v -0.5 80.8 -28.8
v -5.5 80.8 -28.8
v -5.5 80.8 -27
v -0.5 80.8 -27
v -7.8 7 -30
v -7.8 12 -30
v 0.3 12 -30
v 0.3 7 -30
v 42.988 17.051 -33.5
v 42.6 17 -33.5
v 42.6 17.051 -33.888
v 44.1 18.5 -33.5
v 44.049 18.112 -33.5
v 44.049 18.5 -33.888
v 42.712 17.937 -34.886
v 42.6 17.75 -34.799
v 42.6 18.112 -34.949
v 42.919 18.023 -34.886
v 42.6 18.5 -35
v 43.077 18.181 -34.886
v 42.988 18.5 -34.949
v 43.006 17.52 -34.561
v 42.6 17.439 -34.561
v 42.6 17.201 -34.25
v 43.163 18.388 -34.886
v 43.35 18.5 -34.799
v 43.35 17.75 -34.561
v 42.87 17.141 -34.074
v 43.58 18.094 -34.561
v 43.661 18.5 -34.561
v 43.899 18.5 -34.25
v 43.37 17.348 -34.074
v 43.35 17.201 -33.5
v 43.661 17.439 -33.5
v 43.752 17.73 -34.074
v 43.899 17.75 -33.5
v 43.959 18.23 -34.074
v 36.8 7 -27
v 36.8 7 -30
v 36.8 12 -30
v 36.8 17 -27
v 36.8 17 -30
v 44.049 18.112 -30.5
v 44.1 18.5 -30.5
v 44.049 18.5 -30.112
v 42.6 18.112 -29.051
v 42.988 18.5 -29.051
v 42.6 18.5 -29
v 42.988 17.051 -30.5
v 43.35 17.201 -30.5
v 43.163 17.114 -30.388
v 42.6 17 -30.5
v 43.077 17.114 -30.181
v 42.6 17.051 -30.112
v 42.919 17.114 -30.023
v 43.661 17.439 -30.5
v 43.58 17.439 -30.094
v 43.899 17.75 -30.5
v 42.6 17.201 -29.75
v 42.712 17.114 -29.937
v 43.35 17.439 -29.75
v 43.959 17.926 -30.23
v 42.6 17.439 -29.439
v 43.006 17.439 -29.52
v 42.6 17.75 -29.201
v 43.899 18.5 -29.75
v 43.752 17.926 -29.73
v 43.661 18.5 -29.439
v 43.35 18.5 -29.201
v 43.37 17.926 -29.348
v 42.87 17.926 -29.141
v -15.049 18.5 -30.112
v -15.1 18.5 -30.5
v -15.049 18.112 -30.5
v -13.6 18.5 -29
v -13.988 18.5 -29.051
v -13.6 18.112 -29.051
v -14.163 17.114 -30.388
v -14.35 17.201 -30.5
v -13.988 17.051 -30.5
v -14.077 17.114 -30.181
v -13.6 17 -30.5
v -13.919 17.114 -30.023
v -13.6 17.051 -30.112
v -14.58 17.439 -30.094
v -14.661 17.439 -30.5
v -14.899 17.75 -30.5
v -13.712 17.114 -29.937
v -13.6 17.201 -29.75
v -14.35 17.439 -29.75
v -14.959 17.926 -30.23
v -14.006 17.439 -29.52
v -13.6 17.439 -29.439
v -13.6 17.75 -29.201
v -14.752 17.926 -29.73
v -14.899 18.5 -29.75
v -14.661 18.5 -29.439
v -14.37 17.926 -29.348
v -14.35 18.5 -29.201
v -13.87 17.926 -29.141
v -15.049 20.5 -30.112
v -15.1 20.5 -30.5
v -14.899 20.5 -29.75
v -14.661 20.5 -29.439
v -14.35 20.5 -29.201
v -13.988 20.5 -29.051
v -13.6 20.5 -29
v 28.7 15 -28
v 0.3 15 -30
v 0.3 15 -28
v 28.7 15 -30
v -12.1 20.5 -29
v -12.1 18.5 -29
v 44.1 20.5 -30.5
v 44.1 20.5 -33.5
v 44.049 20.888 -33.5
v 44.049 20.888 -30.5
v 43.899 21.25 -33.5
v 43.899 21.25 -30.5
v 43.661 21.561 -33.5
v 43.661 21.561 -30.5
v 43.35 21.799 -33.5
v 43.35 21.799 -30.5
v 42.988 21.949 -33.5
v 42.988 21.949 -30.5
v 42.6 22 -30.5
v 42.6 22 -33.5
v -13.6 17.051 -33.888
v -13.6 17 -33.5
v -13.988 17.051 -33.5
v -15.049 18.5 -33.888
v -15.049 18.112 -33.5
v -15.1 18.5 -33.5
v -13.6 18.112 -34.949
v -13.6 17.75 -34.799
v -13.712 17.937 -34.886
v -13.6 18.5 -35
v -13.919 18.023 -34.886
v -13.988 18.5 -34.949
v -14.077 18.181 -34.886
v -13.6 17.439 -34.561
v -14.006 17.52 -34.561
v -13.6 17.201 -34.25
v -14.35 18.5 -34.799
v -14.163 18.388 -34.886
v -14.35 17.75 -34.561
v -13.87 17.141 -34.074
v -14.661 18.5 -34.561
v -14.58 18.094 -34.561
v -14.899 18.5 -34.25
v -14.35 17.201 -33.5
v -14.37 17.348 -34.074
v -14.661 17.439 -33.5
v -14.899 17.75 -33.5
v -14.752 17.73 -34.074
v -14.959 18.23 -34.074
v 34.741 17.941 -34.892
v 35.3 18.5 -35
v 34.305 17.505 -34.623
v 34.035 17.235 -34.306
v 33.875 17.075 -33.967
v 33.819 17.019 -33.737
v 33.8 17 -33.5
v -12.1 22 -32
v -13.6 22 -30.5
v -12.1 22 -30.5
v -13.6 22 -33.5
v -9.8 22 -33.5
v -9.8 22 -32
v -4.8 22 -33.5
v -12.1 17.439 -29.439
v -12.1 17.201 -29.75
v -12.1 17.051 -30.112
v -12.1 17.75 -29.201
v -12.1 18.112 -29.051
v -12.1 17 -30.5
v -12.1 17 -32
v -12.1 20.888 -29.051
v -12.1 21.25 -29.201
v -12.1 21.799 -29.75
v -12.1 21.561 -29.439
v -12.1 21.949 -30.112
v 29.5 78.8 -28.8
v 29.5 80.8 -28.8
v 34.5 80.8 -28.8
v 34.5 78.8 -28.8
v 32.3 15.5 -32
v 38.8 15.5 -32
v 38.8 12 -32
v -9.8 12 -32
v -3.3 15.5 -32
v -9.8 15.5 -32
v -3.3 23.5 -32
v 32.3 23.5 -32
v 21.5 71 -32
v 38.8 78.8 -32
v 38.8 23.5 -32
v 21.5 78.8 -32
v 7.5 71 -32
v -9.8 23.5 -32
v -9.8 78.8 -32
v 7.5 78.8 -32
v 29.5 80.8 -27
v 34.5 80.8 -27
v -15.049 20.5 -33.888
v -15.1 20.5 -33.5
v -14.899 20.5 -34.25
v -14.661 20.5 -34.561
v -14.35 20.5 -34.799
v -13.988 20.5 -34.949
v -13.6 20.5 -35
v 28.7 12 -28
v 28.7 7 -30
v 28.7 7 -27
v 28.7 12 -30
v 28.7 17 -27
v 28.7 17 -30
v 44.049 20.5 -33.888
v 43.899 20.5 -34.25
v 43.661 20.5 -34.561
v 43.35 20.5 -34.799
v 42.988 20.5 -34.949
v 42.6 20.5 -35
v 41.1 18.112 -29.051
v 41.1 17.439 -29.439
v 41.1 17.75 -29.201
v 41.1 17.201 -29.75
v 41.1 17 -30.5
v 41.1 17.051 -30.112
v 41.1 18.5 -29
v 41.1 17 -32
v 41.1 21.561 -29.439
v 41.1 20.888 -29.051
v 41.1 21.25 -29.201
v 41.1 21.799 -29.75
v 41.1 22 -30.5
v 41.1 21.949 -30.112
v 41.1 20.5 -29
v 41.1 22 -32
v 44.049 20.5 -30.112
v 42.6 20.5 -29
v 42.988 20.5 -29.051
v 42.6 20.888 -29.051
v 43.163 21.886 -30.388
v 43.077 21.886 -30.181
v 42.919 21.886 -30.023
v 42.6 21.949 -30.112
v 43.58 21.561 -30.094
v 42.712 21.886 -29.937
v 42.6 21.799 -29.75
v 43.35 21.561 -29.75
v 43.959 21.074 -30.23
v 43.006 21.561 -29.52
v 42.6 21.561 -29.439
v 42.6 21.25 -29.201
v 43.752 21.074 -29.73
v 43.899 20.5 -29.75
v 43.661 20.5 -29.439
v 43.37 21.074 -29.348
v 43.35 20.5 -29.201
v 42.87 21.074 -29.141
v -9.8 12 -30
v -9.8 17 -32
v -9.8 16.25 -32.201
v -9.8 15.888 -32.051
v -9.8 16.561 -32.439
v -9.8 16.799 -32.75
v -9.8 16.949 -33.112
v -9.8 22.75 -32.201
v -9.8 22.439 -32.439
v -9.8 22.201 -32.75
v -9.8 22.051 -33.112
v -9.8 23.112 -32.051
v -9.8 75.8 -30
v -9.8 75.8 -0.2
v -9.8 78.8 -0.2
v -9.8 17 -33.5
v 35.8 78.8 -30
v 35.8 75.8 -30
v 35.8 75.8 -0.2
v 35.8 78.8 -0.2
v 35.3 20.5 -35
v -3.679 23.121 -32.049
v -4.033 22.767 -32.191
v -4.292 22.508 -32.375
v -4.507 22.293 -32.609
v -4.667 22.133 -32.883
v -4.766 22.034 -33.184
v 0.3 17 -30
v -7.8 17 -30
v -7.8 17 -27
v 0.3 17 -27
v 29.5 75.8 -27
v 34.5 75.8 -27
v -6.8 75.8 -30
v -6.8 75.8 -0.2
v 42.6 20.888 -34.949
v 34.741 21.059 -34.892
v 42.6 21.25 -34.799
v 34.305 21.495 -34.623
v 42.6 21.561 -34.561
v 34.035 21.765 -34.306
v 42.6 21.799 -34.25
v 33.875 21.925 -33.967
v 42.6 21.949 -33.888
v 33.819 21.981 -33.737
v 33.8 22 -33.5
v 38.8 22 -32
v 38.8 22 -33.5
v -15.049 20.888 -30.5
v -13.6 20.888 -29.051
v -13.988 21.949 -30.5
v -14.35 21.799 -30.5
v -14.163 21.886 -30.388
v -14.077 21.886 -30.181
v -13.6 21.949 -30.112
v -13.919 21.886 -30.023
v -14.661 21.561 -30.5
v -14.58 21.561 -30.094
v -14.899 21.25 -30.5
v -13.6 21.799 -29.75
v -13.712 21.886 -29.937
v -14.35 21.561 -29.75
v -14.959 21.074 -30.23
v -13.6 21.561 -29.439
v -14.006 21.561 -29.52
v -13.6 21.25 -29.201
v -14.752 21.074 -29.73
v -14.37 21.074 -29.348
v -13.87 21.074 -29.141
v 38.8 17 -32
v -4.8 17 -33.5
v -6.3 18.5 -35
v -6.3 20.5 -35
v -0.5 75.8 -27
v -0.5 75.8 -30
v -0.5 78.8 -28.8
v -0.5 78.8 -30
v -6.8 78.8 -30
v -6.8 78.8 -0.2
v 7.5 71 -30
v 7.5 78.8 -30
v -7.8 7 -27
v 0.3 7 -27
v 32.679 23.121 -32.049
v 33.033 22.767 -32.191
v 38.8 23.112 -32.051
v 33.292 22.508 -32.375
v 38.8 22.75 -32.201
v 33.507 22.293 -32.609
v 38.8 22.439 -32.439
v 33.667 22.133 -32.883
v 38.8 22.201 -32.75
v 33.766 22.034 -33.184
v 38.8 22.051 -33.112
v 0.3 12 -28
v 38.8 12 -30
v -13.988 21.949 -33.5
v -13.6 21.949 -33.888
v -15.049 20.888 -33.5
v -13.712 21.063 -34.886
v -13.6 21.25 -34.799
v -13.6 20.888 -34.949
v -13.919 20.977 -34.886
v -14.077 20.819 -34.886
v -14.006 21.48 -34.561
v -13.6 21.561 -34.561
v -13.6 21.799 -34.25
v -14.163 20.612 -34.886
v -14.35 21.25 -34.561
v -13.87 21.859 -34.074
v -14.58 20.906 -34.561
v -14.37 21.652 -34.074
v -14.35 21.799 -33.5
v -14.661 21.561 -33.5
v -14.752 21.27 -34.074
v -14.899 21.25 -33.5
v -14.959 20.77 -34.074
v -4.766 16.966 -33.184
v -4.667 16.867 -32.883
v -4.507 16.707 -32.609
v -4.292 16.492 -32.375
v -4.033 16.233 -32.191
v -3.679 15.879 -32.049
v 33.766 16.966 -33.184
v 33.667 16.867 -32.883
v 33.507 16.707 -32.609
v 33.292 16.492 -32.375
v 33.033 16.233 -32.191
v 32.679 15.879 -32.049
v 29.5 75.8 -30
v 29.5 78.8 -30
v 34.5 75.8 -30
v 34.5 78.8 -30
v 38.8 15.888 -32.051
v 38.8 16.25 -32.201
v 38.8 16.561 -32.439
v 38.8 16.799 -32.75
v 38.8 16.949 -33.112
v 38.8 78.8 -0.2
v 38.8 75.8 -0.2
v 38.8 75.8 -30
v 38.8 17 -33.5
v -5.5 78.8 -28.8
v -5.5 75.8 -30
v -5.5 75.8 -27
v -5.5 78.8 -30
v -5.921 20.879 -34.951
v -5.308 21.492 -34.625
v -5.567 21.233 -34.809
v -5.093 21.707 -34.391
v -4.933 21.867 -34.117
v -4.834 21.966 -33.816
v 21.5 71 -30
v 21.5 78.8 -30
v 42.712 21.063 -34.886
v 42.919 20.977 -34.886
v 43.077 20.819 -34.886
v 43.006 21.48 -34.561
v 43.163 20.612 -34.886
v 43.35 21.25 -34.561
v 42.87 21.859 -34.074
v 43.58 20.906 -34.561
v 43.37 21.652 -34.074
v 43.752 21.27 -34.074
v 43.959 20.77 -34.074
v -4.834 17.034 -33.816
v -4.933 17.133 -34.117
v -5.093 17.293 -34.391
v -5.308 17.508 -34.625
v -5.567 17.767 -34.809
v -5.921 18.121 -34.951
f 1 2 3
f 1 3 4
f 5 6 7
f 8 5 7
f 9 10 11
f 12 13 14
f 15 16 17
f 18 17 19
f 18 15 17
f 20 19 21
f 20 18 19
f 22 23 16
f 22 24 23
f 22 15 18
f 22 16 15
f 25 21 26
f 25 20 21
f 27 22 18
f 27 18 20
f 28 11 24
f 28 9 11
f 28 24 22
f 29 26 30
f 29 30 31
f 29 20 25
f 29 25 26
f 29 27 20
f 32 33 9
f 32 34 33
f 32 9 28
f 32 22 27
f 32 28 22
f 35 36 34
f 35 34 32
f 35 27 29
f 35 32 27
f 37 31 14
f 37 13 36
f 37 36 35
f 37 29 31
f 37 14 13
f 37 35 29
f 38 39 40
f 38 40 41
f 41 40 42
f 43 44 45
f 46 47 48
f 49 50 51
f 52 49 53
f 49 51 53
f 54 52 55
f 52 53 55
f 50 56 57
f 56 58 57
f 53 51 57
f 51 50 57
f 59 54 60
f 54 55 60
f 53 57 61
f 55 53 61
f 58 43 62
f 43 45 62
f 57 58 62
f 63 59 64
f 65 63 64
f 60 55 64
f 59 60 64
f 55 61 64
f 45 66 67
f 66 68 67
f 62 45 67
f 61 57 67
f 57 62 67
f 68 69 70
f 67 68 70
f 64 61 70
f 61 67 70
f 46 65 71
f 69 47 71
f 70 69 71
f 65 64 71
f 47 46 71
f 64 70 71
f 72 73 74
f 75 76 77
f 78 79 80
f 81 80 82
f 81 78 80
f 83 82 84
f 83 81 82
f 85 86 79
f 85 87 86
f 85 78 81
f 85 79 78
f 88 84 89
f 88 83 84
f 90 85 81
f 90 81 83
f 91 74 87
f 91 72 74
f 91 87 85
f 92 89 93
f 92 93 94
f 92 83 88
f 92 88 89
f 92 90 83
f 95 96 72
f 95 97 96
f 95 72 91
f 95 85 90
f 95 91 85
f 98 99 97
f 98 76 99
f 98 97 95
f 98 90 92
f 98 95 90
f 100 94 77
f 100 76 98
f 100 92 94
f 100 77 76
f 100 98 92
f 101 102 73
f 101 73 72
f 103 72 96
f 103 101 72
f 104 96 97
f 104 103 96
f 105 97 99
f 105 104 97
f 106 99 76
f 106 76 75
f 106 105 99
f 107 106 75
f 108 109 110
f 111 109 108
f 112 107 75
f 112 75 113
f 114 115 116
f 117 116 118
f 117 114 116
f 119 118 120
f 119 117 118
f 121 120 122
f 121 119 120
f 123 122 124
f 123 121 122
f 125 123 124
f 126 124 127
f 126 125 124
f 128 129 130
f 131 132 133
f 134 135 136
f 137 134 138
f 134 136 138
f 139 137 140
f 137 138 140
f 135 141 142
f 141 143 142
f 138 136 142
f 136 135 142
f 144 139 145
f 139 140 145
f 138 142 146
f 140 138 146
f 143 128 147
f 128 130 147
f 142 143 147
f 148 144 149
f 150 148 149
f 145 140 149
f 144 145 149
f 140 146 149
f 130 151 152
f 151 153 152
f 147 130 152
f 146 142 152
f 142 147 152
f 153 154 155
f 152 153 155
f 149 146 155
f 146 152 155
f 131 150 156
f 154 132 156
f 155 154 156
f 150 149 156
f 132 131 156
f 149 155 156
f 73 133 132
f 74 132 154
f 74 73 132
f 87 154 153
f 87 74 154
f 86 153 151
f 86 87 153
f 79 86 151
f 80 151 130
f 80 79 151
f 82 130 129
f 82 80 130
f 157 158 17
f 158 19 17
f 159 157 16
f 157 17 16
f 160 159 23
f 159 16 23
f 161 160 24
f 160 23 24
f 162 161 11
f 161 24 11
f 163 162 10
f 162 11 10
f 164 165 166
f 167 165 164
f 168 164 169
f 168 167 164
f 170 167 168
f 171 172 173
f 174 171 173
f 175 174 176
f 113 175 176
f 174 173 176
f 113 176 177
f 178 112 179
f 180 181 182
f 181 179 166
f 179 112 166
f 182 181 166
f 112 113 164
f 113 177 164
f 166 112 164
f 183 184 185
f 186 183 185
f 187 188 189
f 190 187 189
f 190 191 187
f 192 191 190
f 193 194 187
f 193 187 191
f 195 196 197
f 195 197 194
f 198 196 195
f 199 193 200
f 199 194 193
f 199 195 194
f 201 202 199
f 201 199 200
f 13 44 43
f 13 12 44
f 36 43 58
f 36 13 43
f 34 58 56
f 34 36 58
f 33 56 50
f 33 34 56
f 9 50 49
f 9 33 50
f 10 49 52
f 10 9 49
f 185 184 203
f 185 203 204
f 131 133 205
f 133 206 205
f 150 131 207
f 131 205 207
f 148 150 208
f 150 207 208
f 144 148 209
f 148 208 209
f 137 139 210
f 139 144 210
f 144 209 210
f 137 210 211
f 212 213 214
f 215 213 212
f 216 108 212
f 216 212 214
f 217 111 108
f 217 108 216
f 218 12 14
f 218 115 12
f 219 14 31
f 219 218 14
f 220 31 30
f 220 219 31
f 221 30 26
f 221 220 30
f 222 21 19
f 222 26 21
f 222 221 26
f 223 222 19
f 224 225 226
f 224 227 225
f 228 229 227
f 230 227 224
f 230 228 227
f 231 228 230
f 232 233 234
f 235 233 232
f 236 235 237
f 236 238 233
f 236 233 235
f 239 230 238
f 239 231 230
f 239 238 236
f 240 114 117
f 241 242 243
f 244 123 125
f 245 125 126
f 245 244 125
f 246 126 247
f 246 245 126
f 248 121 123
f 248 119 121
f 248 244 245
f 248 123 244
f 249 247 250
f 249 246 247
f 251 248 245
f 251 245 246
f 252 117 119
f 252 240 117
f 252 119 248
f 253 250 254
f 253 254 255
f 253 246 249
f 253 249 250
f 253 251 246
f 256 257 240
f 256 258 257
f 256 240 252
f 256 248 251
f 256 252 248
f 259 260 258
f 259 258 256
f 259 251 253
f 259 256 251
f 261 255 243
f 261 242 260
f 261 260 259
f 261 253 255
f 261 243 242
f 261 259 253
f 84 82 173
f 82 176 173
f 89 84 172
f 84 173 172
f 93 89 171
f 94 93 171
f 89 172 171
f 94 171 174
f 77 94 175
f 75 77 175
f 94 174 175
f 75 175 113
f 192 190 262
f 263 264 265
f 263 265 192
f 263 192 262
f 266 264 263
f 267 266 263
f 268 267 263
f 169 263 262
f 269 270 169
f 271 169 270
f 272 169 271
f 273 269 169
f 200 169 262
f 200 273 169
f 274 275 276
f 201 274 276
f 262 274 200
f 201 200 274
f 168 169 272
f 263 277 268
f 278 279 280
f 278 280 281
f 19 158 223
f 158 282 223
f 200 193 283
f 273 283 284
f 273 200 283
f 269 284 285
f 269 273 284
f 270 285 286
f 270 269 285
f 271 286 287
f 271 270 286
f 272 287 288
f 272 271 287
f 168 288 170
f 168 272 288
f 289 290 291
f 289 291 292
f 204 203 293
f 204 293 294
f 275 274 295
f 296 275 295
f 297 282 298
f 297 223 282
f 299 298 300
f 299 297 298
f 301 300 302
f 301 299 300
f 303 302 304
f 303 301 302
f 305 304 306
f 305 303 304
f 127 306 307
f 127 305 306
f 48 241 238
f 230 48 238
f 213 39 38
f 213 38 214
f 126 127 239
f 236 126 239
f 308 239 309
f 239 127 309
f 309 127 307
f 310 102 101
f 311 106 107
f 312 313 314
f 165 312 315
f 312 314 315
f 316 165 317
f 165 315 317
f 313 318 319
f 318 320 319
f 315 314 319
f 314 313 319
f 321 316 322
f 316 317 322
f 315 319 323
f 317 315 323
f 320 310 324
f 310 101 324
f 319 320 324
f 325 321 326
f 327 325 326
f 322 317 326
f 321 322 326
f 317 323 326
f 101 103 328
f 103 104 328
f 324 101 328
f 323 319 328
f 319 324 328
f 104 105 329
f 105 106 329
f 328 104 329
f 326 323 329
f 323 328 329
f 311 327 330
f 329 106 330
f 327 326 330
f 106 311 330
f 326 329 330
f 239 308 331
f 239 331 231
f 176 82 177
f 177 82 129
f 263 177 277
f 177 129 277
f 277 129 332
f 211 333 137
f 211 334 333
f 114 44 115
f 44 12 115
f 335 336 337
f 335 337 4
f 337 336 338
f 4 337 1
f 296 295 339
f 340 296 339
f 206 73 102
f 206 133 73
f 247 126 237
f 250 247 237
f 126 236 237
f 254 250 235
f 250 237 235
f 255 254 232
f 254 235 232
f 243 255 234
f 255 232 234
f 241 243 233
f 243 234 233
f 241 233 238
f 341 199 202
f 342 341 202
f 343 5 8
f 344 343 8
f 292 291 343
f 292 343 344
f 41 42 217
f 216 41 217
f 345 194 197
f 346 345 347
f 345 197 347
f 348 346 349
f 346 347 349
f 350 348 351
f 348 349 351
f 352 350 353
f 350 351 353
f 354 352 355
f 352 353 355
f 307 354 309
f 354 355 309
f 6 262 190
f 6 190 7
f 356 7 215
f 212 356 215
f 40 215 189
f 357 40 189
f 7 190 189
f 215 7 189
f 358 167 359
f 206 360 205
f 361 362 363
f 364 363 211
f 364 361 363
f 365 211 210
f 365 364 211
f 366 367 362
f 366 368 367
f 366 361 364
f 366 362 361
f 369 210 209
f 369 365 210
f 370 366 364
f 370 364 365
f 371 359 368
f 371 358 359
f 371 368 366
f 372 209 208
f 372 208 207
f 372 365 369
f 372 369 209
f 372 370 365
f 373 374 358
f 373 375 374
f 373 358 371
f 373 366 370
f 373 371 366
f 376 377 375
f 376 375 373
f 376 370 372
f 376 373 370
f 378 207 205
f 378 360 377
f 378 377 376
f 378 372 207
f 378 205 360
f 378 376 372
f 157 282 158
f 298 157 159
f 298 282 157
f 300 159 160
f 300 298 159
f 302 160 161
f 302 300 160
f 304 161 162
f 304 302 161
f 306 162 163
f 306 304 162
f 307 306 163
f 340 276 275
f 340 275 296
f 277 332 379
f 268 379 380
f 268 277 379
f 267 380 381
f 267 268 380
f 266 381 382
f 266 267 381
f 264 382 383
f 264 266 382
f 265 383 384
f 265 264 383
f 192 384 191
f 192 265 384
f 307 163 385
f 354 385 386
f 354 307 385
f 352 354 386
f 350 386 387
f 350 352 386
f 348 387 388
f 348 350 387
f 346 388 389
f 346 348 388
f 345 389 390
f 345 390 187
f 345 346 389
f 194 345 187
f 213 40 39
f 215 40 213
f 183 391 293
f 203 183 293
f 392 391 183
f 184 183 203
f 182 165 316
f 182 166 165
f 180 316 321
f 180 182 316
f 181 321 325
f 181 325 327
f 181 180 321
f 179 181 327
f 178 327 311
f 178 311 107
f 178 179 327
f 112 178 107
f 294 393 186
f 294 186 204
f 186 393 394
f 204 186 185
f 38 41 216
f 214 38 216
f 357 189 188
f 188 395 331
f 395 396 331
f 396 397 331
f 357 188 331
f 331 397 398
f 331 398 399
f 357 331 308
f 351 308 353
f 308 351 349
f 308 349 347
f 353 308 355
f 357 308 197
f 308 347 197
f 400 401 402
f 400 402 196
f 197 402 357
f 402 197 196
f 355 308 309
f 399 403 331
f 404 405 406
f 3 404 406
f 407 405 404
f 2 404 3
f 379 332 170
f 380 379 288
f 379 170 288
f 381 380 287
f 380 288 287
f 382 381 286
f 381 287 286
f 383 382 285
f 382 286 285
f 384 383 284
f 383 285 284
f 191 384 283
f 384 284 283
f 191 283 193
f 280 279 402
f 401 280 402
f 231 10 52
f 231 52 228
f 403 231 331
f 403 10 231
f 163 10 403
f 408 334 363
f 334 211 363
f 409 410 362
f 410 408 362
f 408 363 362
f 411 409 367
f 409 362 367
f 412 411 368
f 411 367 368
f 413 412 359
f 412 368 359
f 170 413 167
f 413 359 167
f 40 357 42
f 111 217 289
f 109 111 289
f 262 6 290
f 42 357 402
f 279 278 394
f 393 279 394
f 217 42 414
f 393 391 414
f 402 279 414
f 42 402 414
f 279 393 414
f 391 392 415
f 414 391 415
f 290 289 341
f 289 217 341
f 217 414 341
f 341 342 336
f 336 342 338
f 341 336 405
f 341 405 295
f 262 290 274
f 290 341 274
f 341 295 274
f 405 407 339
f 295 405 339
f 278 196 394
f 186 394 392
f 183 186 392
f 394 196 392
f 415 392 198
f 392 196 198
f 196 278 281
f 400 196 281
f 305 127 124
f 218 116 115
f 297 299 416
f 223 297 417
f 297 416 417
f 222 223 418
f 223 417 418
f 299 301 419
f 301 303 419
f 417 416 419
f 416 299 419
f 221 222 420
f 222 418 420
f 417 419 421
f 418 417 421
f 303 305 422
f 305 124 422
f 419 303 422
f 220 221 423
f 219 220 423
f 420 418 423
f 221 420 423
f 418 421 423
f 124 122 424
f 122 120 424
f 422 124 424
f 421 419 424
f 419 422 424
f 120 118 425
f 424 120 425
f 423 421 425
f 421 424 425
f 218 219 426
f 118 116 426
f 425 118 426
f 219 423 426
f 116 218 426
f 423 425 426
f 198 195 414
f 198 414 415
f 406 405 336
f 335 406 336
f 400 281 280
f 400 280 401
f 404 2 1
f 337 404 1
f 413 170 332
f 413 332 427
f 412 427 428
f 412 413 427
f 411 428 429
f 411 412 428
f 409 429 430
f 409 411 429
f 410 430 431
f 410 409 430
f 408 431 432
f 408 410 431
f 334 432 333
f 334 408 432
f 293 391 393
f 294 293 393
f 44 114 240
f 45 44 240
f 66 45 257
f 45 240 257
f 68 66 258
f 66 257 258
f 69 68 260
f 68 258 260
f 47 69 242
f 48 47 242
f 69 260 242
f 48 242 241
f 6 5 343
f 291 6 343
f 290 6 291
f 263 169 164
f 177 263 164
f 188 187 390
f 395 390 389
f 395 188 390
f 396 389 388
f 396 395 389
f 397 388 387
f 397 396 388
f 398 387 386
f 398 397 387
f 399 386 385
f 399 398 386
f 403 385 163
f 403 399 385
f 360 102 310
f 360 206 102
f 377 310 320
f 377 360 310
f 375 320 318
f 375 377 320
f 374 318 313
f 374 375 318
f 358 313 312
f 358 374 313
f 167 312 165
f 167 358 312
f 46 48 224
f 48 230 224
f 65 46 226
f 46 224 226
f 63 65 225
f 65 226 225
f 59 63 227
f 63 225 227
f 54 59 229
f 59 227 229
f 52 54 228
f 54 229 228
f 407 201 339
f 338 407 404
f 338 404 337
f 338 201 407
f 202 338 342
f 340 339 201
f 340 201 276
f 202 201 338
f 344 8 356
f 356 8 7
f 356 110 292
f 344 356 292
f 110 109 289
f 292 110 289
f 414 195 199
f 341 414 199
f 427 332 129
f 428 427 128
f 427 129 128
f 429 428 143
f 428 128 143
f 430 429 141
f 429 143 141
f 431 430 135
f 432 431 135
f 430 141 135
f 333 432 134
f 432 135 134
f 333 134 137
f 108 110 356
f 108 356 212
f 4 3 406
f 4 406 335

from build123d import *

# Parameters (mm, degrees)
SKETCH_1_W             = 48.6
SKETCH_1_H             = 66.8
EXTRUDE_1_DEPTH        = 2
SKETCH_2_W             = 8.1
SKETCH_2_H             = 10
EXTRUDE_2_DEPTH        = 3
SKETCH_3_W             = 28.4
SKETCH_3_H             = 3
EXTRUDE_3_DEPTH        = 2
SKETCH_4_W             = 14
SKETCH_4_H             = 8
CUT_EXTRUDE_1_DEPTH    = 88.976587795
SKETCH_5_W             = 5
SKETCH_5_H             = 5
EXTRUDE_4_DEPTH        = 3
SKETCH_6_W             = 5
SKETCH_6_H             = 1.2
CUT_EXTRUDE_2_DEPTH    = 2
SKETCH_7_W             = 3
SKETCH_7_H             = 3
EXTRUDE_5_DEPTH        = 29.8
SKETCH_8_W             = 10.3
SKETCH_8_H             = 5
EXTRUDE_6_DEPTH        = 3
SKETCH_9_W             = 3
SKETCH_9_H             = 5
EXTRUDE_7_DEPTH        = 3
FILLET_1_R             = 1.5
FILLET_1_OF_MIRROR_2_R = 1.5


with BuildPart() as part:
    # 草图1 → 凸台-拉伸1 (new body)
    with BuildSketch(Plane(origin=(0, 0, -32), x_dir=(-1, 0, 0), z_dir=(0, 0, -1))):
        with Locations((-14.5, 45.4)):
            Rectangle(SKETCH_1_W, SKETCH_1_H)
    extrude(amount=-EXTRUDE_1_DEPTH)

    # 草图2 → 凸台-拉伸2 (add)
    with BuildSketch(Plane.XY.offset(-30)):
        with Locations((-3.75, 12)):
            Rectangle(SKETCH_2_W, SKETCH_2_H)
    extrude_2 = extrude(amount=EXTRUDE_2_DEPTH)

    # 镜向1: 凸台-拉伸2 across plane
    add(extrude_2.mirror(Plane.ZY.offset(-14.5)))

    # 草图3 → 凸台-拉伸3 (add)
    with BuildSketch(Plane.XY.offset(-30)):
        with Locations((14.5, 13.5)):
            Rectangle(SKETCH_3_W, SKETCH_3_H)
    extrude(amount=EXTRUDE_3_DEPTH)

    # 草图4 → 切除-拉伸1 (cut, through all)
    with BuildSketch(Plane(origin=(0, 0, -32), x_dir=(-1, 0, 0), z_dir=(0, 0, -1))):
        with Locations((-14.5, 75)):
            Rectangle(SKETCH_4_W, SKETCH_4_H)
    extrude(amount=-CUT_EXTRUDE_1_DEPTH, mode=Mode.SUBTRACT)

    # 草图5 → 凸台-拉伸4 (add)
    with BuildSketch(Plane.XY.offset(-30)):
        with Locations((-3, 78.3)):
            Rectangle(SKETCH_5_W, SKETCH_5_H)
        with Locations((32, 78.3)):
            Rectangle(SKETCH_5_W, SKETCH_5_H)
    extrude(amount=EXTRUDE_4_DEPTH)

    # 草图6 → 切除-拉伸2 (cut)
    with BuildSketch(Plane(origin=(0, 80.8, 0), x_dir=(1, 0, 0), z_dir=(0, 1, 0))):
        with Locations((-3, 29.4)):
            Rectangle(SKETCH_6_W, SKETCH_6_H)
        with Locations((32, 29.4)):
            Rectangle(SKETCH_6_W, SKETCH_6_H)
    extrude(amount=-CUT_EXTRUDE_2_DEPTH, mode=Mode.SUBTRACT)

    # 草图7 → 凸台-拉伸5 (add)
    with BuildSketch(Plane.XY.offset(-30)):
        with Locations((-8.3, 77.3)):
            Rectangle(SKETCH_7_W, SKETCH_7_H)
        with Locations((37.3, 77.3)):
            Rectangle(SKETCH_7_W, SKETCH_7_H)
    extrude(amount=EXTRUDE_5_DEPTH)

    # 草图8 → 凸台-拉伸6 (add)
    with BuildSketch(Plane(origin=(0, 0, -32), x_dir=(-1, 0, 0), z_dir=(0, 0, -1))):
        with Locations((9.95, 19.5)):
            Rectangle(SKETCH_8_W, SKETCH_8_H)
    extrude_6 = extrude(amount=EXTRUDE_6_DEPTH)

    # 草图9 → 凸台-拉伸7 (add)
    with BuildSketch(Plane.XY.offset(-32)):
        with Locations((-13.6, 19.5)):
            Rectangle(SKETCH_9_W, SKETCH_9_H)
    extrude_7 = extrude(amount=EXTRUDE_7_DEPTH)

    # 圆角1
    fillet_1_edges = [part.edges().sort_by_distance(p)[0] for p in [
        (-15.1, 19.5, -29),
        (-15.1, 22, -32),
        (-15.1, 17, -32),
        (-4.8, 19.5, -32),
        (-7.3, 17, -32),
        (-9.95, 17, -35),
        (-4.8, 19.5, -35),
        (-7.3, 22, -32),
        (-9.95, 22, -35),
        (-15.1, 19.5, -35),
        (-13.6, 22, -29),
        (-13.6, 17, -29),
    ]]
    fillet(fillet_1_edges, radius=FILLET_1_R - 0.0001)  # a hair under: the kernel refuses the full size

    # 镜向2: 凸台-拉伸6, 凸台-拉伸7 across plane
    add(extrude_6.mirror(Plane.ZY.offset(-14.5)))
    add(extrude_7.mirror(Plane.ZY.offset(-14.5)))

    # 圆角1 of 镜向2
    fillet_1_of_mirror_2_edges = [part.edges().sort_by_distance(p)[0] for p in [
        (44.1, 19.5, -29),
        (44.1, 22, -32),
        (44.1, 17, -32),
        (33.8, 19.5, -32),
        (36.3, 17, -32),
        (38.95, 17, -35),
        (33.8, 19.5, -35),
        (36.3, 22, -32),
        (38.95, 22, -35),
        (44.1, 19.5, -35),
        (42.6, 22, -29),
        (42.6, 17, -29),
    ]]
    fillet(fillet_1_of_mirror_2_edges, radius=FILLET_1_OF_MIRROR_2_R - 0.0001)  # a hair under: the kernel refuses the full size


solid = part.part
